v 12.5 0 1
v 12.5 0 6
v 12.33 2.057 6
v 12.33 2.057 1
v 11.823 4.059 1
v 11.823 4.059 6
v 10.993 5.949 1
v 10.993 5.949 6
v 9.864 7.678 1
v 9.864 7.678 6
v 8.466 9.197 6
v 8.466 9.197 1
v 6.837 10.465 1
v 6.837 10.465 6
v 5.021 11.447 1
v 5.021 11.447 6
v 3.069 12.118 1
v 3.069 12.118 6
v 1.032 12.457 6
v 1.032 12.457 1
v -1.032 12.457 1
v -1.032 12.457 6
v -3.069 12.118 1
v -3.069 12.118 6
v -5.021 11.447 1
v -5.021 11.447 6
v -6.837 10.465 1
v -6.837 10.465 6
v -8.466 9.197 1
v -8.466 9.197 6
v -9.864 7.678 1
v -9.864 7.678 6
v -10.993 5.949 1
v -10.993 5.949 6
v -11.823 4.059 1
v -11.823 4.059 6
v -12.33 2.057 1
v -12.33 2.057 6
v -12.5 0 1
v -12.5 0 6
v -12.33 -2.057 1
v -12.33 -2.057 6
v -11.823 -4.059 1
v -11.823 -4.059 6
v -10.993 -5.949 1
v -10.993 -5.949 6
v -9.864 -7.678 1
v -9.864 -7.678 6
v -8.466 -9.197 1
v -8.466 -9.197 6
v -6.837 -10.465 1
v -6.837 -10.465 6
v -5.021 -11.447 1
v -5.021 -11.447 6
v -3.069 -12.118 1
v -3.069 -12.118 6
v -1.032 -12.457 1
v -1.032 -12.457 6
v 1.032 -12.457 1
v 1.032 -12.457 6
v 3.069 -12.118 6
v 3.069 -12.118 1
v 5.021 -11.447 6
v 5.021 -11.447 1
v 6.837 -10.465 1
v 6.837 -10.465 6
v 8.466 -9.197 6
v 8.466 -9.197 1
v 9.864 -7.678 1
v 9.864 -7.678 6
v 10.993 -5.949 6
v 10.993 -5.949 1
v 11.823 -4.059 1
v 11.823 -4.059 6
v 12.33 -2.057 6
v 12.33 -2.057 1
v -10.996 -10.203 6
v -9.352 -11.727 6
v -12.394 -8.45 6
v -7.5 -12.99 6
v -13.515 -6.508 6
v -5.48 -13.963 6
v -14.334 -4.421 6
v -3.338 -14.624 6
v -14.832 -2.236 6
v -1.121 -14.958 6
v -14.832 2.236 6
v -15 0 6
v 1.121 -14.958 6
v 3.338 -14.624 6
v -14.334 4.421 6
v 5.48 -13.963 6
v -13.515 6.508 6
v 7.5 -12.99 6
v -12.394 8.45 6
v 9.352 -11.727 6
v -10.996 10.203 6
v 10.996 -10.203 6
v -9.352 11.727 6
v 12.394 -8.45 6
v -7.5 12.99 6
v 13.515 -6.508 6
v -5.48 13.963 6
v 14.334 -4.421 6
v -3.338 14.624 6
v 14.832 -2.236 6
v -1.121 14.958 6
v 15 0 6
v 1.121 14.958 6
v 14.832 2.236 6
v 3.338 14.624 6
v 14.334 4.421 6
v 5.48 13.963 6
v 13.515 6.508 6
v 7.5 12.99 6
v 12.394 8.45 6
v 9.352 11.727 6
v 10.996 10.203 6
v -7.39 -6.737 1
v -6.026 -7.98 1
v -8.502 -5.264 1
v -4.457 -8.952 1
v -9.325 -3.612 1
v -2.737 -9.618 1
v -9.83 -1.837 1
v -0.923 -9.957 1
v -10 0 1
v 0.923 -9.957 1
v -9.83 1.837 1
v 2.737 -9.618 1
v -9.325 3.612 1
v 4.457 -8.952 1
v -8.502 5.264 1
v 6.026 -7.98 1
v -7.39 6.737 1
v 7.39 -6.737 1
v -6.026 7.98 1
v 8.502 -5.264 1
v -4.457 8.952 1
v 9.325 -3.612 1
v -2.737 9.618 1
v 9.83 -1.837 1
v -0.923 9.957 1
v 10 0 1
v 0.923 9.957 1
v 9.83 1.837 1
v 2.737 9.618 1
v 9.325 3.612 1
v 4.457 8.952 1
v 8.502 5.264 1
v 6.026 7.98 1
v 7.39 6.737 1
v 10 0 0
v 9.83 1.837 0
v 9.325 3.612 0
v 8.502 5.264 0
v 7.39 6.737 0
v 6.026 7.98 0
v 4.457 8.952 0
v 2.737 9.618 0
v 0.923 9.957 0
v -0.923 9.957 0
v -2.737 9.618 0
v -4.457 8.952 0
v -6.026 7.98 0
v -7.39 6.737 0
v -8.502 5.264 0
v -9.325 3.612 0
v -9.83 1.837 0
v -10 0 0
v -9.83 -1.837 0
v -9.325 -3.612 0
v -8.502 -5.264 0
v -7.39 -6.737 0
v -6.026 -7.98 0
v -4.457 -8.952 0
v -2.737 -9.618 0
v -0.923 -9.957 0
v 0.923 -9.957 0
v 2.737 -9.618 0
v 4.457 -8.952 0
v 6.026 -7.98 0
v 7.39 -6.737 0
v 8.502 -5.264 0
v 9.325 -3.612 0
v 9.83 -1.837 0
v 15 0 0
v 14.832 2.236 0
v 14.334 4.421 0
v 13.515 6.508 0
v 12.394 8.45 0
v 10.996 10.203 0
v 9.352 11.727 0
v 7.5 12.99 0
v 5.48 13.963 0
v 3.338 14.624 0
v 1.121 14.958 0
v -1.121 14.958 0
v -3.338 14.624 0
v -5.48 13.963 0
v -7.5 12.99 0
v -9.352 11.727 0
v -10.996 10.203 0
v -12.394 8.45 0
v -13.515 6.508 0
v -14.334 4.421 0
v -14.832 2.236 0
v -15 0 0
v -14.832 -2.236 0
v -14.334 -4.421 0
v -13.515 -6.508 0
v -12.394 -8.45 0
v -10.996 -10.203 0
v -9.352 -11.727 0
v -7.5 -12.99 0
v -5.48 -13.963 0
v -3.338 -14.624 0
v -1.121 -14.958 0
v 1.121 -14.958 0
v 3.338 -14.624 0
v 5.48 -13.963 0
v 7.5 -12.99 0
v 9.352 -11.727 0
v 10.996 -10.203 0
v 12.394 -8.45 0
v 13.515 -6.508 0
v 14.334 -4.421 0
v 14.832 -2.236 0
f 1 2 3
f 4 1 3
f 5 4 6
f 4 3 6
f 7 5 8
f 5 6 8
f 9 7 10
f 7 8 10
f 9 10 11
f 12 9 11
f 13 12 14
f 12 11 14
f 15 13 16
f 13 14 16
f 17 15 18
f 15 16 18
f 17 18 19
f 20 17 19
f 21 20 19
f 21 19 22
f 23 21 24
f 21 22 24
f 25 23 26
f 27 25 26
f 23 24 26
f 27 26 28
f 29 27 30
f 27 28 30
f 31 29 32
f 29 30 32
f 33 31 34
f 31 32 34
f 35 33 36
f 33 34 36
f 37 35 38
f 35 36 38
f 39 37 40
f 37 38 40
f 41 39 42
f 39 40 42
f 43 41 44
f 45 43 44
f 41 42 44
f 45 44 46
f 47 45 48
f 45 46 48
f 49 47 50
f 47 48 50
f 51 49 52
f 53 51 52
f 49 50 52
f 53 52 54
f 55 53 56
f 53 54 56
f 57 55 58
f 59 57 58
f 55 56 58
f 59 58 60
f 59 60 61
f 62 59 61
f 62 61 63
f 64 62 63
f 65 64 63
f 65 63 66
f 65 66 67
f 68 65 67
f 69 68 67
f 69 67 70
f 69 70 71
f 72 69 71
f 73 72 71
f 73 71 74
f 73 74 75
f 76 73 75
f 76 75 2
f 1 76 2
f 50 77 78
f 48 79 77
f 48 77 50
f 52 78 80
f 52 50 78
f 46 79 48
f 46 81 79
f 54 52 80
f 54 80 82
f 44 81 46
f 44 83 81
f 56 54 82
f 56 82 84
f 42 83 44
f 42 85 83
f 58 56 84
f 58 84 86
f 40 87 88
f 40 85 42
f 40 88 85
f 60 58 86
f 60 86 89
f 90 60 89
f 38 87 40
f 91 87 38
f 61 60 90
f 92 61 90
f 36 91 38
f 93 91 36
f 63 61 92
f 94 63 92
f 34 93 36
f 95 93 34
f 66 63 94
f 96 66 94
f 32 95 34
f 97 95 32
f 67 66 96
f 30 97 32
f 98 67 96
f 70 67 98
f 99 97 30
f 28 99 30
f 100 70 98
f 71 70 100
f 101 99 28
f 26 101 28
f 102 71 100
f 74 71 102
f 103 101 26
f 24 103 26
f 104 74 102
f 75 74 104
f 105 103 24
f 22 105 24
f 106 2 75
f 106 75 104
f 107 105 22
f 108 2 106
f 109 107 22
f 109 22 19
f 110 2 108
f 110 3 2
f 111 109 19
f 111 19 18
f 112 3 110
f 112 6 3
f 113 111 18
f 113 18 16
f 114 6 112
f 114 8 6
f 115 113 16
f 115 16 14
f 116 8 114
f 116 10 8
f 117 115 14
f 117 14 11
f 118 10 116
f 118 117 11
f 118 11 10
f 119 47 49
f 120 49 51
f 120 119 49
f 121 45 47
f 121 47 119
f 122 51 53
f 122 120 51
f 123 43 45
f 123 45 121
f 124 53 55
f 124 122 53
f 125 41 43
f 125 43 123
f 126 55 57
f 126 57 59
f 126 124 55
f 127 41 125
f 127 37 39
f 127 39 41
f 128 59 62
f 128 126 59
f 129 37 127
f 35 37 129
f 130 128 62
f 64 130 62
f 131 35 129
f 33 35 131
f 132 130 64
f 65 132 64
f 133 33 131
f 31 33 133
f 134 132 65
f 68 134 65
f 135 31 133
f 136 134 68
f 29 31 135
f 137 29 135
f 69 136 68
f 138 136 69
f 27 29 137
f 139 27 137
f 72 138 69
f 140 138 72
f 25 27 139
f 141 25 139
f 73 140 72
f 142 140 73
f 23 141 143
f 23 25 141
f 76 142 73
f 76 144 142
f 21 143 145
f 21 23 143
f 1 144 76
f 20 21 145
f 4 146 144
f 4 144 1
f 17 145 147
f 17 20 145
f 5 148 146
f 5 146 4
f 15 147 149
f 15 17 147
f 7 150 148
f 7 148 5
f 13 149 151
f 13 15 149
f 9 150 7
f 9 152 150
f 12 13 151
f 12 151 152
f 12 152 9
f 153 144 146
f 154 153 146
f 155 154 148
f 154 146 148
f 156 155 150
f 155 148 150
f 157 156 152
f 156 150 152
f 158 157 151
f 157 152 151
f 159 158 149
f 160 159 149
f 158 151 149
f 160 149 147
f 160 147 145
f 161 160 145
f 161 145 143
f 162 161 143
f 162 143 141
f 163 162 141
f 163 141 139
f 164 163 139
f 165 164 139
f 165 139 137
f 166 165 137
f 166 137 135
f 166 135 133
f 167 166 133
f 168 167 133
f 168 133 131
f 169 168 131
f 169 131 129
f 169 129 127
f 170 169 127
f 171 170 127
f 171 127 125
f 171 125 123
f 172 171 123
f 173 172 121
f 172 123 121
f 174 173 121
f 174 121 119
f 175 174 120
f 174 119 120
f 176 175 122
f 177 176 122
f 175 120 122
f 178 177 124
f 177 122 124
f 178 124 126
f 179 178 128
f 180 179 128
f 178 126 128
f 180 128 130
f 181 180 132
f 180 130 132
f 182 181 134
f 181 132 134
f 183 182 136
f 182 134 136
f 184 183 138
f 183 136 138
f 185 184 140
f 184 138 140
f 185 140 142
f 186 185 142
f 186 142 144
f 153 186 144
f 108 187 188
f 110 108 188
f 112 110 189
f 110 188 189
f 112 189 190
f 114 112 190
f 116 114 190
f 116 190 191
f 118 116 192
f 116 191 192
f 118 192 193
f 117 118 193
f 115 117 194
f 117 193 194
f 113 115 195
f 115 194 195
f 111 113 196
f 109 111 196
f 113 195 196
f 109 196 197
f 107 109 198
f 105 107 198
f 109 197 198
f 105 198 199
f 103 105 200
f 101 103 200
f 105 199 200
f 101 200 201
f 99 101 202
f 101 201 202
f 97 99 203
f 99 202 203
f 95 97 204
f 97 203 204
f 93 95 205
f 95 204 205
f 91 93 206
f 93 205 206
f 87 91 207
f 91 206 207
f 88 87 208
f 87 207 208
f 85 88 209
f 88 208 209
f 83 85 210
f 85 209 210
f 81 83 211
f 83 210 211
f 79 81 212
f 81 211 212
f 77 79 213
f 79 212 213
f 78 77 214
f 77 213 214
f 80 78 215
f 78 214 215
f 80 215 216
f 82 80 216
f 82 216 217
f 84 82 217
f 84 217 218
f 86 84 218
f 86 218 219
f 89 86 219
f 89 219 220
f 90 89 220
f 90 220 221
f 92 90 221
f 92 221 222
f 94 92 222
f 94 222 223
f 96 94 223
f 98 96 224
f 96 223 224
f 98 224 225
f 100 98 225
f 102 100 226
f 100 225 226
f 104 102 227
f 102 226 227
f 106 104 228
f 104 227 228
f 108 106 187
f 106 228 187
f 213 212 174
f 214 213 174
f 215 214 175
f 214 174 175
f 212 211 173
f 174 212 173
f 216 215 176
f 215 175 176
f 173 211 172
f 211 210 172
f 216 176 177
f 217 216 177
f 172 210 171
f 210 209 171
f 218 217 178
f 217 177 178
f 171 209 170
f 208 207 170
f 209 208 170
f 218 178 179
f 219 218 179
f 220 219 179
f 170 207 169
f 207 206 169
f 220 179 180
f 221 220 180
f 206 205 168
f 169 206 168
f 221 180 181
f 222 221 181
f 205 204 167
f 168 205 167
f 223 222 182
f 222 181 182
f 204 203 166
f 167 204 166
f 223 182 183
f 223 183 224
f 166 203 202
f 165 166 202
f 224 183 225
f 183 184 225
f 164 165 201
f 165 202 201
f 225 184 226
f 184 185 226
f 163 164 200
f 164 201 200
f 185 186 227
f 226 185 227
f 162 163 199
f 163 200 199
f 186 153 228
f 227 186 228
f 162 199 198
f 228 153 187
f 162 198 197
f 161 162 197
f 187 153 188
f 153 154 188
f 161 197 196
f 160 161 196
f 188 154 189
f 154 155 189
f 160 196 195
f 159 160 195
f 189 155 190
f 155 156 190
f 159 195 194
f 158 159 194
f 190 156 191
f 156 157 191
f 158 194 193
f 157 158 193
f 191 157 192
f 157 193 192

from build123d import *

# Parameters (mm, degrees)
SKETCH_R        = 15
PAD_DEPTH       = 6
SKETCH001_R     = 12.5
POCKET_DEPTH    = 5
SKETCH002_R     = 10
POCKET001_DEPTH = 1.001


with BuildPart() as part:
    # Sketch → Pad (new body)
    with BuildSketch(Plane.XY):
        Circle(SKETCH_R)
    extrude(amount=PAD_DEPTH)

    # Sketch001 (on Face3 of Pad) → Pocket (cut)
    with BuildSketch(Plane.XY.offset(6)):
        Circle(SKETCH001_R)
    extrude(amount=-POCKET_DEPTH, mode=Mode.SUBTRACT)

    # Sketch002 (on Face5 of Pocket) → Pocket001 (cut, through all)
    with BuildSketch(Plane.XY.offset(1)):
        Circle(SKETCH002_R)
    extrude(amount=-POCKET001_DEPTH, mode=Mode.SUBTRACT)


solid = part.part
